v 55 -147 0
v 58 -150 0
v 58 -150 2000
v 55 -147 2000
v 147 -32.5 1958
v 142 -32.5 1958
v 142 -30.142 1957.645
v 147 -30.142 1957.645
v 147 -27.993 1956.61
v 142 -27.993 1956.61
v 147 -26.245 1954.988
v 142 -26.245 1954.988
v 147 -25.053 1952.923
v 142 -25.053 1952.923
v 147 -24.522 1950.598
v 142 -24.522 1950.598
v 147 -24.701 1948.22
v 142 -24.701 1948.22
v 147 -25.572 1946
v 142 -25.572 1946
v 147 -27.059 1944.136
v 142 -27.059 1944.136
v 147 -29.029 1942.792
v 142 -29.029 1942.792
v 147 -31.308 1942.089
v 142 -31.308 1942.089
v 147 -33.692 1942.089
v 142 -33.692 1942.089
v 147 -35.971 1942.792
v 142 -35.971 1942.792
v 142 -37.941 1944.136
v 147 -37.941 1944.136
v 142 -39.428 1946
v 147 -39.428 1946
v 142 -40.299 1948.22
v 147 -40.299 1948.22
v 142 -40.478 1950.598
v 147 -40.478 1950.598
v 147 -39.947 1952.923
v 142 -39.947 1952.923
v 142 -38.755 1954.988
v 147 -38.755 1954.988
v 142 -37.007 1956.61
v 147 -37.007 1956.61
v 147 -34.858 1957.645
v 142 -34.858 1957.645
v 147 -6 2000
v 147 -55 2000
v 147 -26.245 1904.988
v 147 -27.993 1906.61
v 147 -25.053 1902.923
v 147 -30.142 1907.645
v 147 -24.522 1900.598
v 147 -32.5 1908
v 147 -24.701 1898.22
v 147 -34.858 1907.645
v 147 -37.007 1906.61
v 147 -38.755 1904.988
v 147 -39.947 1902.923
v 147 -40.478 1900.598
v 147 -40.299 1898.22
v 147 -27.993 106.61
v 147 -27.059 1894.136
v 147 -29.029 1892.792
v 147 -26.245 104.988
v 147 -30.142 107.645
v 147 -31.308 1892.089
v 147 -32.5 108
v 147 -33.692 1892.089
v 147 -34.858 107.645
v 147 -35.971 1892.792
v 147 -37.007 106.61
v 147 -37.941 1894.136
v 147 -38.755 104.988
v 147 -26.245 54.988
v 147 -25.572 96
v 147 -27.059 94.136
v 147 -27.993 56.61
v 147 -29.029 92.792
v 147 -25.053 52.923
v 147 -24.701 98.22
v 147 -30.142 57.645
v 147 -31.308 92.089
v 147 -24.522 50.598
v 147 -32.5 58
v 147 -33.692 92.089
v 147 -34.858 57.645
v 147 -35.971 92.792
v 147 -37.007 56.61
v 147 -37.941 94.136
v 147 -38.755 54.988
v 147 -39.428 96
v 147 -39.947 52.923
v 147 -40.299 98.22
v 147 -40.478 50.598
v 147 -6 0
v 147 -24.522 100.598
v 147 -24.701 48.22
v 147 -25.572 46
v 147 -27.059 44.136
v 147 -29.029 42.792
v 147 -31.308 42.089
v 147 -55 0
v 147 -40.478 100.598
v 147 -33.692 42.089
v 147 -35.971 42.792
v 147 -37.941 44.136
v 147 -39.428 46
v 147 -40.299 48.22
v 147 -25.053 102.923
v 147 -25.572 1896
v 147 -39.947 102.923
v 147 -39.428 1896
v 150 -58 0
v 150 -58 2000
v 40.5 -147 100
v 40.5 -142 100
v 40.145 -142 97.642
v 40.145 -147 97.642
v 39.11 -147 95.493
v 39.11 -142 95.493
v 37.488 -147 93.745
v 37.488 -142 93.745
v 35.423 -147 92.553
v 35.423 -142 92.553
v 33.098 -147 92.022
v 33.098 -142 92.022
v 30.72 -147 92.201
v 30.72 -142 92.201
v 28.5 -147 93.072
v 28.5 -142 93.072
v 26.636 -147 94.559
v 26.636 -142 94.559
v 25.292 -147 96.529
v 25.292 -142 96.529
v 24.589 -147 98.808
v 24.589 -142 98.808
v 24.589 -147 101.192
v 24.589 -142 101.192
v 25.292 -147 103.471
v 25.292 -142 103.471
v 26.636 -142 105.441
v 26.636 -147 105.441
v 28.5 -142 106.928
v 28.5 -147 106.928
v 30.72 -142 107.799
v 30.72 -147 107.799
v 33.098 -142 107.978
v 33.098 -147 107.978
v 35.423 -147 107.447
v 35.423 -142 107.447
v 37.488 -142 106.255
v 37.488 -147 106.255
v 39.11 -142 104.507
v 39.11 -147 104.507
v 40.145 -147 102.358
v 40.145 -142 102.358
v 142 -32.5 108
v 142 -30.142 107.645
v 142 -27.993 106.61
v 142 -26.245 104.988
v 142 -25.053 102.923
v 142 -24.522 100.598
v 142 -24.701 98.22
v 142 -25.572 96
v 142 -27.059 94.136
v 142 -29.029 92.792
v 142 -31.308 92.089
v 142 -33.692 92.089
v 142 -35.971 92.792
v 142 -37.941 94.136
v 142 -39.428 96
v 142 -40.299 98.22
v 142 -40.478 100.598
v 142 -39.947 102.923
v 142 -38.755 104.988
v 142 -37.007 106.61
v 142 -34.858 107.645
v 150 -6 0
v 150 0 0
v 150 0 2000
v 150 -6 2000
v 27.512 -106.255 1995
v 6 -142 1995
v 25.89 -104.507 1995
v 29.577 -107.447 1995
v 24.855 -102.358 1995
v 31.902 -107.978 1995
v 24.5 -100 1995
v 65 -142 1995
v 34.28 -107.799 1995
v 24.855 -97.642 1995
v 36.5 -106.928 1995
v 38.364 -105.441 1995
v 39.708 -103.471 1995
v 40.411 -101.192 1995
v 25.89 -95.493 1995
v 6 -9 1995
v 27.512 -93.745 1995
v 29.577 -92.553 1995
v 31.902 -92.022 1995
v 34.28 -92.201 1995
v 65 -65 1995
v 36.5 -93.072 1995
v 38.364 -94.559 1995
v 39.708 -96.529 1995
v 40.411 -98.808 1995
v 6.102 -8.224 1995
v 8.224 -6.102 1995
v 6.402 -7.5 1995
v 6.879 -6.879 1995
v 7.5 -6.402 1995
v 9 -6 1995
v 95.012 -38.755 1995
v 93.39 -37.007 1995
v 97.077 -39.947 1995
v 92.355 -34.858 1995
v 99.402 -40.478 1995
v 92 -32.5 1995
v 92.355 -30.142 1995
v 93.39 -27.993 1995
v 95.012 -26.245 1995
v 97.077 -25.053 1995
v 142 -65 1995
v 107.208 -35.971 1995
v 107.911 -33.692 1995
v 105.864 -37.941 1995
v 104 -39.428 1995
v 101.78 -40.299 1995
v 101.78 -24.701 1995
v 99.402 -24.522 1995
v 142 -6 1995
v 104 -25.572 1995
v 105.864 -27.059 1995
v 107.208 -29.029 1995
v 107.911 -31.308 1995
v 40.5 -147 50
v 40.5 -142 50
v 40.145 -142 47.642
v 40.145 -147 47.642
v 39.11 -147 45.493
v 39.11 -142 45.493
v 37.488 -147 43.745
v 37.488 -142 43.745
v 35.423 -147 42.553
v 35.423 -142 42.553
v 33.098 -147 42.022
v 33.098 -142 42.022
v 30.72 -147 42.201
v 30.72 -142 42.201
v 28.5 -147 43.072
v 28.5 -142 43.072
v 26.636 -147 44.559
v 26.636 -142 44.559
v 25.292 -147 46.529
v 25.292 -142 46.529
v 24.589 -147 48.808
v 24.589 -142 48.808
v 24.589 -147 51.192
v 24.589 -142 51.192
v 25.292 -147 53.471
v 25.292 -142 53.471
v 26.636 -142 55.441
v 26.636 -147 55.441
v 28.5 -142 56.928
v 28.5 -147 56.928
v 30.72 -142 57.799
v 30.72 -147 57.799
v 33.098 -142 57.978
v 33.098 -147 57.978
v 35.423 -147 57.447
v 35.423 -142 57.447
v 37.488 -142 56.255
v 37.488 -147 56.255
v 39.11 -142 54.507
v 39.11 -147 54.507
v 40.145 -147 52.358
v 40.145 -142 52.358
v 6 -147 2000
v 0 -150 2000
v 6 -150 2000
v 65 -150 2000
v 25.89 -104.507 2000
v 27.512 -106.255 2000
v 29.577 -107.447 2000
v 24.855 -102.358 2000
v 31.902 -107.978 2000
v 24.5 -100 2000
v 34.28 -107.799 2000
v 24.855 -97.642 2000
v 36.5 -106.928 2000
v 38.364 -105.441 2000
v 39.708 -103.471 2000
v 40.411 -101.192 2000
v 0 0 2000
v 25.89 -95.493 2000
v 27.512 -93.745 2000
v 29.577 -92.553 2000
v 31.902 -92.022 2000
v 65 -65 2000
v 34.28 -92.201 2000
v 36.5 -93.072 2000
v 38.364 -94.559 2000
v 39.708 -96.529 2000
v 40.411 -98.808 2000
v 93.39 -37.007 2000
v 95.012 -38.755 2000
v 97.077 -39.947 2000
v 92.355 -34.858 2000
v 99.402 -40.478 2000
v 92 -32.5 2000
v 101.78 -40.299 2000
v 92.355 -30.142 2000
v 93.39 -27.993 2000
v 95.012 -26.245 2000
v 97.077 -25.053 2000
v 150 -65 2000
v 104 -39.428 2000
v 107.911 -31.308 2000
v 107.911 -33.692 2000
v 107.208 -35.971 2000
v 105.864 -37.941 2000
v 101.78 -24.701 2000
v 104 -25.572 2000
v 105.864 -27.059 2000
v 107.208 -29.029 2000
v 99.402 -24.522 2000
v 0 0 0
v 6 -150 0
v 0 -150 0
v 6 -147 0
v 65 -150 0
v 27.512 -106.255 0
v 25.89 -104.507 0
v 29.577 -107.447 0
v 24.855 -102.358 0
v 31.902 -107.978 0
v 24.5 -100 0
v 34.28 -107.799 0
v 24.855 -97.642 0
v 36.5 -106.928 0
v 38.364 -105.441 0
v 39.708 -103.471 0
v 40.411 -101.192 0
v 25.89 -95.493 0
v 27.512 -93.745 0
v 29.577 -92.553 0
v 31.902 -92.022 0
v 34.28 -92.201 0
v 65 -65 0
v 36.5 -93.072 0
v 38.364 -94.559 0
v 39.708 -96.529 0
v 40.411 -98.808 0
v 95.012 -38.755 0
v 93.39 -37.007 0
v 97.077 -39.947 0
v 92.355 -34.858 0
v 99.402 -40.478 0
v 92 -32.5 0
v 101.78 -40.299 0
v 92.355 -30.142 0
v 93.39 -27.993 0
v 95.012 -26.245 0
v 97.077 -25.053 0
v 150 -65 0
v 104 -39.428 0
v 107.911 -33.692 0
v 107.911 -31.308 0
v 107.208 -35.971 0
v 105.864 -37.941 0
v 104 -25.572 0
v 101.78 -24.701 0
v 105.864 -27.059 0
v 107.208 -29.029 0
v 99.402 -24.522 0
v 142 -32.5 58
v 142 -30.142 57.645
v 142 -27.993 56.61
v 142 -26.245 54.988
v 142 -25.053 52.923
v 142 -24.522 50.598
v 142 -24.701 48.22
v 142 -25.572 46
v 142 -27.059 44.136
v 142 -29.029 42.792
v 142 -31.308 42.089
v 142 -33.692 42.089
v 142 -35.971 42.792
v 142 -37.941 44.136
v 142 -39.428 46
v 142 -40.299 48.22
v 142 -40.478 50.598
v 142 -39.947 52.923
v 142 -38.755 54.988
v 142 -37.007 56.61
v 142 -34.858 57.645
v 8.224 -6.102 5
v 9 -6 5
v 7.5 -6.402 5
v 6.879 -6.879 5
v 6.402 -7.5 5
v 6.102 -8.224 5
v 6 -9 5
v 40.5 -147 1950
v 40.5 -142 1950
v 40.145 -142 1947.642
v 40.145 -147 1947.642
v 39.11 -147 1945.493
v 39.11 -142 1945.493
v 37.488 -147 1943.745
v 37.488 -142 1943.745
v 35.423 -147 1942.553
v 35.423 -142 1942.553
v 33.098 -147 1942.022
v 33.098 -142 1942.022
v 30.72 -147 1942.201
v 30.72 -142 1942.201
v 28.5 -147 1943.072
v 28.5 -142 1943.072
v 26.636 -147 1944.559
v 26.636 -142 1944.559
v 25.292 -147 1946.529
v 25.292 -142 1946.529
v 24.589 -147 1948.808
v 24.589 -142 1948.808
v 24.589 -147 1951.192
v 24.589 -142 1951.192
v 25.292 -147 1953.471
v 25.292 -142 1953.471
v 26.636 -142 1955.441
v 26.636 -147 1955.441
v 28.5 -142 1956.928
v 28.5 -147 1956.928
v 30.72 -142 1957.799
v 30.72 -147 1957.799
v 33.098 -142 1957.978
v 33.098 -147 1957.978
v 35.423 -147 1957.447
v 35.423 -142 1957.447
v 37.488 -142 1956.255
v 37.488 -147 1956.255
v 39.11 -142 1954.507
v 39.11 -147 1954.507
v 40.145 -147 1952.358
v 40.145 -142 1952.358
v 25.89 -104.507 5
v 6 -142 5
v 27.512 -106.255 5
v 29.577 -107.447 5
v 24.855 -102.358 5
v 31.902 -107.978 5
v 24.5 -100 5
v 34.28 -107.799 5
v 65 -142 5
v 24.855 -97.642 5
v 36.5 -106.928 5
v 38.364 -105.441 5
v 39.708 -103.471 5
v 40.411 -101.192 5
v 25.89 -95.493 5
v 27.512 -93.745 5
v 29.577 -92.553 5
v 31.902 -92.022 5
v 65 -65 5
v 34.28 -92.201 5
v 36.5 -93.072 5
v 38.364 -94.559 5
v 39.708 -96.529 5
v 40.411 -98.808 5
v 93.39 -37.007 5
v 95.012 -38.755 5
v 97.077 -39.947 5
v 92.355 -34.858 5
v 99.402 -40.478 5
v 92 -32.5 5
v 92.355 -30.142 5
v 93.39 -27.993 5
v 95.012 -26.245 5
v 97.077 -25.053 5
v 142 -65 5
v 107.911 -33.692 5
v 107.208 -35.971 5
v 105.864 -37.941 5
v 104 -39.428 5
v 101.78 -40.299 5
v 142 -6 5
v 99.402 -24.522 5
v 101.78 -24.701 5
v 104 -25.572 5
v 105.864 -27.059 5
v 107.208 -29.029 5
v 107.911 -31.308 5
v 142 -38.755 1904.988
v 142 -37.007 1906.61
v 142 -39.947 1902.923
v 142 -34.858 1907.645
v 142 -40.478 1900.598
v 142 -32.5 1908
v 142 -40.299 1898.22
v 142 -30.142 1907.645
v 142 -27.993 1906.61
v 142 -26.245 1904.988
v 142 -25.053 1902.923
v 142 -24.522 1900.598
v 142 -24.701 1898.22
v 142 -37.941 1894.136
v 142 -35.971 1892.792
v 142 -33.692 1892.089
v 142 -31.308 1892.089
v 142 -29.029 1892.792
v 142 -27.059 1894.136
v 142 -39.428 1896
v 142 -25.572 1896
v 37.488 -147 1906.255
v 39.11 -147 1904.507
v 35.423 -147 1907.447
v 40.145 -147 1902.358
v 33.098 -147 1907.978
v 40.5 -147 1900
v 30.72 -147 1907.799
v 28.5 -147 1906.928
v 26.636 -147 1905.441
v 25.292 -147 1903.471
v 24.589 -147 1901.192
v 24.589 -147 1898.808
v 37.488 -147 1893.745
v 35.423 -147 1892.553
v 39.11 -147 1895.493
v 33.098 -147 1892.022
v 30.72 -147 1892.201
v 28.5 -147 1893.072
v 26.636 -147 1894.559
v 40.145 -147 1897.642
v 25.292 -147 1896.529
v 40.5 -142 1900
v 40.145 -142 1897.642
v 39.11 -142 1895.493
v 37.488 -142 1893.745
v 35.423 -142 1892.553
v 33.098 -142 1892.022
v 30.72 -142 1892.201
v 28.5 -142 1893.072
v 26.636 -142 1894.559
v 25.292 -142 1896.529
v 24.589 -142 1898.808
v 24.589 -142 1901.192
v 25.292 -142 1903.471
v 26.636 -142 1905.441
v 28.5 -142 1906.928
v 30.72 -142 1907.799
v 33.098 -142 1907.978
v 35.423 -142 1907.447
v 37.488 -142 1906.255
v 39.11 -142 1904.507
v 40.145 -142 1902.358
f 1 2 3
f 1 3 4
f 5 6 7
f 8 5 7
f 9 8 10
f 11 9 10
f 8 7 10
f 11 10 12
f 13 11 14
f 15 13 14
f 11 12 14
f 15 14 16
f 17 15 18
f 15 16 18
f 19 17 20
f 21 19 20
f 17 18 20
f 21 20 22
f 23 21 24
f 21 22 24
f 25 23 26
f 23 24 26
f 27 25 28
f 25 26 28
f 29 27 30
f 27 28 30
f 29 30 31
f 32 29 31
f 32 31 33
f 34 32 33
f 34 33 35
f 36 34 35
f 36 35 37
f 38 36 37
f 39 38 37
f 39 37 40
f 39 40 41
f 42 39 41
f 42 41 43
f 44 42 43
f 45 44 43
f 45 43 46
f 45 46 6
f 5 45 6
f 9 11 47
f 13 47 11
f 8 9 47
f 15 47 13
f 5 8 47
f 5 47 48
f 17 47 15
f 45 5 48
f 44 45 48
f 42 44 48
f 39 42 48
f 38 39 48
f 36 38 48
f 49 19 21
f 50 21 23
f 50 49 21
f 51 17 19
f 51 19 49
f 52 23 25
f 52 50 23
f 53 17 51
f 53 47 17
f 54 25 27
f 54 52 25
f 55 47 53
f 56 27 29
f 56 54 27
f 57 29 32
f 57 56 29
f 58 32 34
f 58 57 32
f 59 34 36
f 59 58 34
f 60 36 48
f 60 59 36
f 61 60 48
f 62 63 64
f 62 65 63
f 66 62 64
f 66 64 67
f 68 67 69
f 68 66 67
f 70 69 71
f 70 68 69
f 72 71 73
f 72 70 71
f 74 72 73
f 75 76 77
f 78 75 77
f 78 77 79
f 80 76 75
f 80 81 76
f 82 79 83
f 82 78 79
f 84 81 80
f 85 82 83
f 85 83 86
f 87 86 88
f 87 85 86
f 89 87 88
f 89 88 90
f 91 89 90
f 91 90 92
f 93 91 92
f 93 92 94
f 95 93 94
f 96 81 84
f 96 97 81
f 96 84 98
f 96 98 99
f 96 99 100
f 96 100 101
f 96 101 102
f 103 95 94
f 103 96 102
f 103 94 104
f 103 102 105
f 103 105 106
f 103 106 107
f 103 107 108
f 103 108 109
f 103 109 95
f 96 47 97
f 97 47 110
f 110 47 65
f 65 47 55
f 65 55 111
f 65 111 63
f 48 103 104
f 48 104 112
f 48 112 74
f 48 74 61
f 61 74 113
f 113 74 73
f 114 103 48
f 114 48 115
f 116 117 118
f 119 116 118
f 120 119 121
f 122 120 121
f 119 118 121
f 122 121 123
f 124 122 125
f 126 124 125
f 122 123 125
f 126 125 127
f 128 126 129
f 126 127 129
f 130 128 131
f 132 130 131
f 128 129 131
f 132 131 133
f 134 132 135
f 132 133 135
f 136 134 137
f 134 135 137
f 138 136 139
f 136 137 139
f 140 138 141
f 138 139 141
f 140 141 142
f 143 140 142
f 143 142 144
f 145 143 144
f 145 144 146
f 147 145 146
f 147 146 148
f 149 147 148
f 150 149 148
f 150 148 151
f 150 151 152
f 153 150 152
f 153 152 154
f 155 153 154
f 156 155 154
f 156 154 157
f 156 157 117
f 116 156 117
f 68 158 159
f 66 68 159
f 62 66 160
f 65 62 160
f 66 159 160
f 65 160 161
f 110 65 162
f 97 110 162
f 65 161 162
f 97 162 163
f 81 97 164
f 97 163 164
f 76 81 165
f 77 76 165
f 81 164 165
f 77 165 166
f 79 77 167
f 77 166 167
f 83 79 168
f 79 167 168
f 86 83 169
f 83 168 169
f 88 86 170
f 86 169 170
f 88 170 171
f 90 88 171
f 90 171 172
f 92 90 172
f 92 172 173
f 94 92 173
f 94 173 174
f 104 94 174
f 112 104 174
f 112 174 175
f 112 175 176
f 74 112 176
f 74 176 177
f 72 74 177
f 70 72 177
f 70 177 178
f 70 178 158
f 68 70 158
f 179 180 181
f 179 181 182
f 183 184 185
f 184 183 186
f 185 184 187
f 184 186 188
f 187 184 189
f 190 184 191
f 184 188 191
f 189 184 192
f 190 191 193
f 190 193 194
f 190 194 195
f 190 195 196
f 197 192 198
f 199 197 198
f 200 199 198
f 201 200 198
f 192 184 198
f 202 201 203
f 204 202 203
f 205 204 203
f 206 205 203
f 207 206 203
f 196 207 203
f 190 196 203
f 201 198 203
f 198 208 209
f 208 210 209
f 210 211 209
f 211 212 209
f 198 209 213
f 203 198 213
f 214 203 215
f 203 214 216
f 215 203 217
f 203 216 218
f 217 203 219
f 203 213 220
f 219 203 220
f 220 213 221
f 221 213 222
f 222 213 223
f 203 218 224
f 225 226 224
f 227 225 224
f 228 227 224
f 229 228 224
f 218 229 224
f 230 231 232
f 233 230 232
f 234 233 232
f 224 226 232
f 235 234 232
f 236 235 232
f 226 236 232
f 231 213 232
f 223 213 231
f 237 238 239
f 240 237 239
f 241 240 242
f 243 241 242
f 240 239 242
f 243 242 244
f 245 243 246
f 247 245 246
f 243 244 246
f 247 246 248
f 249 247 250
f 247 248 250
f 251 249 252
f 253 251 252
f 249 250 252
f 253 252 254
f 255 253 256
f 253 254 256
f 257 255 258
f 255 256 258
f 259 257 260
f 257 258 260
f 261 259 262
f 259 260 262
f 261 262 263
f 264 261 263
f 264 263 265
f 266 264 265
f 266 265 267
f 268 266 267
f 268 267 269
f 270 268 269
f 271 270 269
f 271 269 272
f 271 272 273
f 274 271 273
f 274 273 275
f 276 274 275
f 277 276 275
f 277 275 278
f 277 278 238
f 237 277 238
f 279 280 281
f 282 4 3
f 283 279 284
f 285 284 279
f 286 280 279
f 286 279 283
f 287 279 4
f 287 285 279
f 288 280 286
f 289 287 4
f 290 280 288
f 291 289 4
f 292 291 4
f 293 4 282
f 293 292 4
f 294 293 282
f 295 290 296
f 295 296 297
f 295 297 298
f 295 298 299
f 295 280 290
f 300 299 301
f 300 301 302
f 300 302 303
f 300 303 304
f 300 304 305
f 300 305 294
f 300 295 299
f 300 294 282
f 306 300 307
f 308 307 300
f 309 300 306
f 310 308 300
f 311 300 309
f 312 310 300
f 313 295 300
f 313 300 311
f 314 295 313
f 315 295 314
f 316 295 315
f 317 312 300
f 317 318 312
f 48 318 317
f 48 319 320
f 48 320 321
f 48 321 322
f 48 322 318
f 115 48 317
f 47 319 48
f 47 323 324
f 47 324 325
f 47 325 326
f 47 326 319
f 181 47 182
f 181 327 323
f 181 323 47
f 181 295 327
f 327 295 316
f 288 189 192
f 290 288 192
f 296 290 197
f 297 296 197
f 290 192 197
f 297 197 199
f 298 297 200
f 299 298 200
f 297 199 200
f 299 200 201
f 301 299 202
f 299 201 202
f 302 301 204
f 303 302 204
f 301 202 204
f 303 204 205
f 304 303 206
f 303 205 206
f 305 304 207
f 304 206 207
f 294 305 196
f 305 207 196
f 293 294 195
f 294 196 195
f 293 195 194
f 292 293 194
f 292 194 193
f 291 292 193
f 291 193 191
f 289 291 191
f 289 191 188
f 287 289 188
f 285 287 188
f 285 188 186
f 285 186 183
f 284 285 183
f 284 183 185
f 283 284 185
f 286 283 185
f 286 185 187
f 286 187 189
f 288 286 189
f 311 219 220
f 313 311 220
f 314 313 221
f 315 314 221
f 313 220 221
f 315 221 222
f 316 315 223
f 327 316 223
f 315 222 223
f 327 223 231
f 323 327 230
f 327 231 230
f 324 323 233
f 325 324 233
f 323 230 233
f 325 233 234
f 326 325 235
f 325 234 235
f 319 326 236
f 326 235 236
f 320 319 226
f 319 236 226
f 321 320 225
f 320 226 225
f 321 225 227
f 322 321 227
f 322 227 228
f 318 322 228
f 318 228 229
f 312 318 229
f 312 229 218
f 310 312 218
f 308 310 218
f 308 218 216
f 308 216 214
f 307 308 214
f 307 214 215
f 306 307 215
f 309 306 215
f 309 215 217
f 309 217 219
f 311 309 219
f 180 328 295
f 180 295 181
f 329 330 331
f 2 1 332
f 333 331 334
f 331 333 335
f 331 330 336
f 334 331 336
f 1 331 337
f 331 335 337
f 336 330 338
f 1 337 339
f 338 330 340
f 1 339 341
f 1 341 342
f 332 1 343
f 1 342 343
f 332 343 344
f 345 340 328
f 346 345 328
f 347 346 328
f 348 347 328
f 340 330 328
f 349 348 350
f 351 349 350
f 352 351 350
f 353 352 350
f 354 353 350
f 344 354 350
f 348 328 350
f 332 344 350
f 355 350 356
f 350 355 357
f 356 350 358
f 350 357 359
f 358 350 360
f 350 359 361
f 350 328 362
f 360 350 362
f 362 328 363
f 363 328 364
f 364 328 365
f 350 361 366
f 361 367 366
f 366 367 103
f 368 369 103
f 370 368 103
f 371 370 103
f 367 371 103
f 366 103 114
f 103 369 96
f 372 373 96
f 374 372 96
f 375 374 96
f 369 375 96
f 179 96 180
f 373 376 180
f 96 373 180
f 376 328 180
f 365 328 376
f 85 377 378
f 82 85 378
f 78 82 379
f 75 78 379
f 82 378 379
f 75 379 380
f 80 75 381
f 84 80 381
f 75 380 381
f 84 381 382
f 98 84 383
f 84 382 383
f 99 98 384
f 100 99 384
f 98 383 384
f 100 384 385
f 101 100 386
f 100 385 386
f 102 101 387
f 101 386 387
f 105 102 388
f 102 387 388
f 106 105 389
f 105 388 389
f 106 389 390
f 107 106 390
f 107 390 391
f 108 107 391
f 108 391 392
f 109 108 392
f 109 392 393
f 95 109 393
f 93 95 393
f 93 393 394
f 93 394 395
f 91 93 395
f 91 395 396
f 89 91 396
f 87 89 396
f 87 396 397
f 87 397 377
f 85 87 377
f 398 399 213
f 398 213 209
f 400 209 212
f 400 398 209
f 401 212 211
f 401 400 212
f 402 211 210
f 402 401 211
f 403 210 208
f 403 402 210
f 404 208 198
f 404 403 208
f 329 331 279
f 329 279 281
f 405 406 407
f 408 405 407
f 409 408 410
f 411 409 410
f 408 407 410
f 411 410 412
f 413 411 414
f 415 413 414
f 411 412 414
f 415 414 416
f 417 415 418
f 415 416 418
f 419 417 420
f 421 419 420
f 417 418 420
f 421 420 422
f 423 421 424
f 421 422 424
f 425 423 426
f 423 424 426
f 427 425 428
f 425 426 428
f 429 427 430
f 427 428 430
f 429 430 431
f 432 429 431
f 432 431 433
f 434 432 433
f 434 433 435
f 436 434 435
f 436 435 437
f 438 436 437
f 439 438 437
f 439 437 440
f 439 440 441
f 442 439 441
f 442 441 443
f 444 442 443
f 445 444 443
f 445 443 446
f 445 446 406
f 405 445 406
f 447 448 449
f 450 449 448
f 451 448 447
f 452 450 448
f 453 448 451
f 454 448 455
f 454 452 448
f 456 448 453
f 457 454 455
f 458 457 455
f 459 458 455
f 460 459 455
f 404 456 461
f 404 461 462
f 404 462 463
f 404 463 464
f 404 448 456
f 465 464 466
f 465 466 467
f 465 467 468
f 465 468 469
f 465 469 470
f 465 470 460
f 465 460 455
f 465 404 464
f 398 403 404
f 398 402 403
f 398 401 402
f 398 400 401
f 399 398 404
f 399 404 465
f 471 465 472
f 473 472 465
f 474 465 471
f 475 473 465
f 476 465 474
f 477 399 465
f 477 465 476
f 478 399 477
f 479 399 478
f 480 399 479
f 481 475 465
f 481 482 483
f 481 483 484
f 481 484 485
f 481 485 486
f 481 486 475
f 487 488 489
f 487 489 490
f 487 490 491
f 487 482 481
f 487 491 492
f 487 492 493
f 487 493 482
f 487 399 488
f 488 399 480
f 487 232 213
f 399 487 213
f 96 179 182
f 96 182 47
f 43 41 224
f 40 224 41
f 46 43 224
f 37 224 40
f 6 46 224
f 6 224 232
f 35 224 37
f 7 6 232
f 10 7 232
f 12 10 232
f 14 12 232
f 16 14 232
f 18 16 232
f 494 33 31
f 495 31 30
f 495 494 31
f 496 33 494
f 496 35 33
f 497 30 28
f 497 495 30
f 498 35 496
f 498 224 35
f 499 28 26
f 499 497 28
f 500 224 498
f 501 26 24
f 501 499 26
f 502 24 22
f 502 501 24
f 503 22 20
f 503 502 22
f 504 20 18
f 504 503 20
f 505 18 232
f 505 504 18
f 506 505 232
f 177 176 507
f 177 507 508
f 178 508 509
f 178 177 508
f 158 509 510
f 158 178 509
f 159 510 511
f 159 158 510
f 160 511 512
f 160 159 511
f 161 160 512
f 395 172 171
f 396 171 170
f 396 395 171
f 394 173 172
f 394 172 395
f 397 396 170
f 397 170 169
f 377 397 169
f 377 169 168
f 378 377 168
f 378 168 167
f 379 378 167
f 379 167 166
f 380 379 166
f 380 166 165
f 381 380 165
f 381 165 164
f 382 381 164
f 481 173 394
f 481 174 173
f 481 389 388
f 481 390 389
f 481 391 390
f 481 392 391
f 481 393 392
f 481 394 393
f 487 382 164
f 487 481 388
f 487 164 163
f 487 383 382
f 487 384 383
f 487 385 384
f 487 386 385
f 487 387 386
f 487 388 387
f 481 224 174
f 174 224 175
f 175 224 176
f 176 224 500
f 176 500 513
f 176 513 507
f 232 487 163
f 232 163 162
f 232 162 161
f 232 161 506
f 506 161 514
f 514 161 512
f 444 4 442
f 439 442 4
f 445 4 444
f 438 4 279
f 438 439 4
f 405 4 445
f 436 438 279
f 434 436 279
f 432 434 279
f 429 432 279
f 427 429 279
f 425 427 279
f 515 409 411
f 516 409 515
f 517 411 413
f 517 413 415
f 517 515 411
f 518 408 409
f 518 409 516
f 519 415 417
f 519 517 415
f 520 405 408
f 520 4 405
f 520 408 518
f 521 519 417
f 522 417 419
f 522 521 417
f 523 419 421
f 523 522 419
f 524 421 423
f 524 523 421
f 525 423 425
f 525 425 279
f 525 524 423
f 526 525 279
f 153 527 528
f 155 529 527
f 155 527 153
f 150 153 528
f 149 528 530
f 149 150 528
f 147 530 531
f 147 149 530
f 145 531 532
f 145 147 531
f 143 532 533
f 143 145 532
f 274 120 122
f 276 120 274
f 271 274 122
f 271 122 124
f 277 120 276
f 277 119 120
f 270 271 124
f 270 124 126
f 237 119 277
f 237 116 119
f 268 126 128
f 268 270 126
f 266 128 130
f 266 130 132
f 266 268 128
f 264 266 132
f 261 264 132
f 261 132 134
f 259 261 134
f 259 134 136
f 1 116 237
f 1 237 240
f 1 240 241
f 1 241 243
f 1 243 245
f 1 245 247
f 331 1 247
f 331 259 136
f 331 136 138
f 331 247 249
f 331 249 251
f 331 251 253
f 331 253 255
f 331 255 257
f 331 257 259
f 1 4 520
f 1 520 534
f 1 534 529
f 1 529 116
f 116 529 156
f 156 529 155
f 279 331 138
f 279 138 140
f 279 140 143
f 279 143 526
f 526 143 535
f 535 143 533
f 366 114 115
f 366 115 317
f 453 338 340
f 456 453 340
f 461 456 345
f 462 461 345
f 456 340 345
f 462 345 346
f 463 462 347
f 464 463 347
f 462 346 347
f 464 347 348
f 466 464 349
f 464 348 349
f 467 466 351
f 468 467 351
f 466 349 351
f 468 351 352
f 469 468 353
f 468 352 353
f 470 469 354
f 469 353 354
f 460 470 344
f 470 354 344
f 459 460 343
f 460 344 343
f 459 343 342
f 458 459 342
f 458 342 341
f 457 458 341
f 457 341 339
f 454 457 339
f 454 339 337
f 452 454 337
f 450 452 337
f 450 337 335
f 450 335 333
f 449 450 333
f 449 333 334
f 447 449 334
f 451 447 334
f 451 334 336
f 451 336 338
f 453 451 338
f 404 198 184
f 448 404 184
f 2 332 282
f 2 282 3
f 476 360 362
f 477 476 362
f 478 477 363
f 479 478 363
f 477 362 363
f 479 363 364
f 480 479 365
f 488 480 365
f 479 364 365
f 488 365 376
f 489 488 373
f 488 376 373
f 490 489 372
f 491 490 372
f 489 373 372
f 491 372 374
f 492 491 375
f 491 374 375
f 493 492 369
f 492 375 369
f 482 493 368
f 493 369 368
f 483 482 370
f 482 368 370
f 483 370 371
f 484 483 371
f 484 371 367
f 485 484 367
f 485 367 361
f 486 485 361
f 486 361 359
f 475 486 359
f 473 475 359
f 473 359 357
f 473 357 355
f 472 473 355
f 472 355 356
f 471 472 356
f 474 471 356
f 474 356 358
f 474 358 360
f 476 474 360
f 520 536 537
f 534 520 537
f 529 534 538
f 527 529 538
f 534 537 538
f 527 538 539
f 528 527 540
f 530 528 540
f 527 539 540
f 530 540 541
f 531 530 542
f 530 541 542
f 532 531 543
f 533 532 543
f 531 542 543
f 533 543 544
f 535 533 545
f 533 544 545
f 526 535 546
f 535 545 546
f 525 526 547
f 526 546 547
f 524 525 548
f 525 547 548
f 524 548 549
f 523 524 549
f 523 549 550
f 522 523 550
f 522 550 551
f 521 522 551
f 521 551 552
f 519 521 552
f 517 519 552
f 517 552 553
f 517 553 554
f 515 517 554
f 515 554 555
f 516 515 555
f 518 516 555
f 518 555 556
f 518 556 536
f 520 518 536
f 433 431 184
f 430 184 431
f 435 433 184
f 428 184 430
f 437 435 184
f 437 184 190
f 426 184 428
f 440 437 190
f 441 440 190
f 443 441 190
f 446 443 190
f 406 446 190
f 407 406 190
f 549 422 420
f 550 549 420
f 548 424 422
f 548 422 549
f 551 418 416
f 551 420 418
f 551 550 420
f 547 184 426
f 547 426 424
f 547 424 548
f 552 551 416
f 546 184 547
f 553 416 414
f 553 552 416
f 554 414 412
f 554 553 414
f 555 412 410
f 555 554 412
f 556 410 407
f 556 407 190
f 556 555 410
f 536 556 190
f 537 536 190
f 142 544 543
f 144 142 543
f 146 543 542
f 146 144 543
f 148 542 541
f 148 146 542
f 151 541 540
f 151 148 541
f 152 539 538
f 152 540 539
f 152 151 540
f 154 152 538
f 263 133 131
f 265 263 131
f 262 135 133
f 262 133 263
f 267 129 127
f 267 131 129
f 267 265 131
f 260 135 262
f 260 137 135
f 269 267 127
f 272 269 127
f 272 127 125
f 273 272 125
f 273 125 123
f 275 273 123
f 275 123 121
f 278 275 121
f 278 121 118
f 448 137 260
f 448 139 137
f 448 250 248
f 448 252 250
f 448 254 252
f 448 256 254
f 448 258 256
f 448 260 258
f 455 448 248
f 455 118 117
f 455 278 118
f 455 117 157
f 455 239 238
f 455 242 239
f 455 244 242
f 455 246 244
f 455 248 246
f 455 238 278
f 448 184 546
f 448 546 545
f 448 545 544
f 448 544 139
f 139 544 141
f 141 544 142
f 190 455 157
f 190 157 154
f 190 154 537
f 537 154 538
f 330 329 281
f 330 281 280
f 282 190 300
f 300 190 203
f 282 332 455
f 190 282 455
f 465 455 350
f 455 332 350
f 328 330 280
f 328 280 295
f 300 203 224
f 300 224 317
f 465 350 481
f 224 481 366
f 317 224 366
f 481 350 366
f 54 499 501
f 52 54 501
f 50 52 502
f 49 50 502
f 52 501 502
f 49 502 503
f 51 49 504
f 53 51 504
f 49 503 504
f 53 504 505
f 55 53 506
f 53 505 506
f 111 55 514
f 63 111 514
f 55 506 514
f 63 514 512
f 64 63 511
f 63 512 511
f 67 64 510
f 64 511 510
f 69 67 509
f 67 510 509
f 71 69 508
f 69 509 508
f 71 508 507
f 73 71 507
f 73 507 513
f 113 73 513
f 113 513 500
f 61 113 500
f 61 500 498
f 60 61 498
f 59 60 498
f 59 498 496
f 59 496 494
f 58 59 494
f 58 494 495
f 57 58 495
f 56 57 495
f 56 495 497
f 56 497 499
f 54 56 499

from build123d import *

# Parameters (mm, degrees)
EXTRUDE_1_DEPTH             = 2000
EXTRUDE_2_DEPTH             = 5
HOLE_WIZARD_16_0_16_1_D     = 16
HOLE_WIZARD_16_0_16_2_D     = 16
HOLE_WIZARD_16_0_16_2_DEPTH = 5
HOLE_WIZARD_16_0_16_3_D     = 16
HOLE_WIZARD_16_0_16_3_DEPTH = 5


with BuildPart() as part:
    # Model → 凸台-拉伸1 (new body)
    with BuildSketch(Plane.XY):
        with BuildLine():
            Line((55, -147), (6, -147))
            Line((6, -147), (6, -150))
            Line((6, -150), (0, -150))
            Line((0, -150), (0, 0))
            Line((0, 0), (150, 0))
            Line((150, 0), (150, -6))
            Line((150, -6), (147, -6))
            Line((147, -6), (147, -55))
            Line((147, -55), (150, -58))
            Line((150, -58), (150, -65))
            Line((150, -65), (142, -65))
            Line((142, -65), (142, -6))
            Line((142, -6), (9, -6))
            ThreePointArc((9, -6), (6.878679656, -6.878679656), (6, -9))
            Line((6, -9), (6, -142))
            Line((6, -142), (65, -142))
            Line((65, -142), (65, -150))
            Line((65, -150), (58, -150))
            Line((58, -150), (55, -147))
        make_face()
    extrude(amount=EXTRUDE_1_DEPTH)

    # 草图2 → 凸台-拉伸2 (add)
    with BuildSketch(Plane.XY.offset(2000)):
        Polygon((65, -142), (65, -65), (142, -65), (142, -6), (6, -6), (6, -142), align=None)
    extrude_2 = extrude(amount=-EXTRUDE_2_DEPTH)

    # 镜向1: 凸台-拉伸2 across plane
    add(extrude_2.mirror(Plane.XY.offset(1000)))

    # Ø16.0 (16) 直径孔1 (through all)
    with Locations(Plane.XY.offset(2000)):
        with Locations((100, -32.5), (32.5, -100)):
            Hole(HOLE_WIZARD_16_0_16_1_D / 2)

    # Ø16.0 (16) 直径孔2
    with Locations(Plane(origin=(147, 0, 0), x_dir=(0, 0, -1), z_dir=(1, 0, 0))):
        with Locations((-1950, -32.5), (-1900, -32.5), (-50, -32.5), (-100, -32.5)):
            Hole(HOLE_WIZARD_16_0_16_2_D / 2, depth=HOLE_WIZARD_16_0_16_2_DEPTH)

    # Ø16.0 (16) 直径孔3
    with Locations(Plane(origin=(0, -147, 0), x_dir=(-1, 0, 0), z_dir=(0, -1, 0))):
        with Locations((-32.5, -1950), (-32.5, -1900), (-32.5, -50), (-32.5, -100)):
            Hole(HOLE_WIZARD_16_0_16_3_D / 2, depth=HOLE_WIZARD_16_0_16_3_DEPTH)


solid = part.part
